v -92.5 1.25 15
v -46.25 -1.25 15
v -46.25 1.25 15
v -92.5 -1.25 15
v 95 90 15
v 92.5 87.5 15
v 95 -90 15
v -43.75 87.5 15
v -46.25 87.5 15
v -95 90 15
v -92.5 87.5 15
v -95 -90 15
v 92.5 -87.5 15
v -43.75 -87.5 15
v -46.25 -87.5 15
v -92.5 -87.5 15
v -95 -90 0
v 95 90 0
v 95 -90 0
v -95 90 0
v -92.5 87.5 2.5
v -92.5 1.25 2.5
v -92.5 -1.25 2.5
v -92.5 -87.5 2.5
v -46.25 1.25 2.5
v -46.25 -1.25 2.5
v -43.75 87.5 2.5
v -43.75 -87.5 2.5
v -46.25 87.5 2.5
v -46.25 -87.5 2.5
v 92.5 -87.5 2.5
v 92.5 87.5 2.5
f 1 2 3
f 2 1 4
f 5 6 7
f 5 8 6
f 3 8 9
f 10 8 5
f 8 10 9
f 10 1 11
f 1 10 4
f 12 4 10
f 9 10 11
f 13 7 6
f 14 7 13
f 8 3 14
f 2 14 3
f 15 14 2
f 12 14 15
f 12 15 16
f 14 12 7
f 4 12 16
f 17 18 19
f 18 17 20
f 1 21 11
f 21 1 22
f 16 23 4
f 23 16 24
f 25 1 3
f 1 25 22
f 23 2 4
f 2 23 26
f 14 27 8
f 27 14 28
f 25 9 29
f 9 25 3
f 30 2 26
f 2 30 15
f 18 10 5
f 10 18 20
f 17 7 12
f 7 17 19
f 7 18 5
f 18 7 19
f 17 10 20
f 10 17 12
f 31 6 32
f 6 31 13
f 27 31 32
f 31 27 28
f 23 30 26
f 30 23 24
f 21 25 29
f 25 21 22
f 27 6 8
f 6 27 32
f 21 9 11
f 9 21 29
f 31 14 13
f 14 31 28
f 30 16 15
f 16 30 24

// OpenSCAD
$fn = 6;

l = 190;
w = 180;
h = 15;

wall = 2.5;
base = 2.5;

l_in = l - wall*2;
w_in = w - wall*2;
h_in = h;

tray_offset = w/4;

translate([-tray_offset,0,h/2])
  union(){
    translate([-l/8,0,0])
      cube([l/4,wall,h], true);
    cube([wall,w,h], true);
  }

difference(){
  translate([0,0,h/2]) cube([l,w,h], true);
  translate([0,0,h/2+base]) cube([l_in, w_in, h_in], true);
}
